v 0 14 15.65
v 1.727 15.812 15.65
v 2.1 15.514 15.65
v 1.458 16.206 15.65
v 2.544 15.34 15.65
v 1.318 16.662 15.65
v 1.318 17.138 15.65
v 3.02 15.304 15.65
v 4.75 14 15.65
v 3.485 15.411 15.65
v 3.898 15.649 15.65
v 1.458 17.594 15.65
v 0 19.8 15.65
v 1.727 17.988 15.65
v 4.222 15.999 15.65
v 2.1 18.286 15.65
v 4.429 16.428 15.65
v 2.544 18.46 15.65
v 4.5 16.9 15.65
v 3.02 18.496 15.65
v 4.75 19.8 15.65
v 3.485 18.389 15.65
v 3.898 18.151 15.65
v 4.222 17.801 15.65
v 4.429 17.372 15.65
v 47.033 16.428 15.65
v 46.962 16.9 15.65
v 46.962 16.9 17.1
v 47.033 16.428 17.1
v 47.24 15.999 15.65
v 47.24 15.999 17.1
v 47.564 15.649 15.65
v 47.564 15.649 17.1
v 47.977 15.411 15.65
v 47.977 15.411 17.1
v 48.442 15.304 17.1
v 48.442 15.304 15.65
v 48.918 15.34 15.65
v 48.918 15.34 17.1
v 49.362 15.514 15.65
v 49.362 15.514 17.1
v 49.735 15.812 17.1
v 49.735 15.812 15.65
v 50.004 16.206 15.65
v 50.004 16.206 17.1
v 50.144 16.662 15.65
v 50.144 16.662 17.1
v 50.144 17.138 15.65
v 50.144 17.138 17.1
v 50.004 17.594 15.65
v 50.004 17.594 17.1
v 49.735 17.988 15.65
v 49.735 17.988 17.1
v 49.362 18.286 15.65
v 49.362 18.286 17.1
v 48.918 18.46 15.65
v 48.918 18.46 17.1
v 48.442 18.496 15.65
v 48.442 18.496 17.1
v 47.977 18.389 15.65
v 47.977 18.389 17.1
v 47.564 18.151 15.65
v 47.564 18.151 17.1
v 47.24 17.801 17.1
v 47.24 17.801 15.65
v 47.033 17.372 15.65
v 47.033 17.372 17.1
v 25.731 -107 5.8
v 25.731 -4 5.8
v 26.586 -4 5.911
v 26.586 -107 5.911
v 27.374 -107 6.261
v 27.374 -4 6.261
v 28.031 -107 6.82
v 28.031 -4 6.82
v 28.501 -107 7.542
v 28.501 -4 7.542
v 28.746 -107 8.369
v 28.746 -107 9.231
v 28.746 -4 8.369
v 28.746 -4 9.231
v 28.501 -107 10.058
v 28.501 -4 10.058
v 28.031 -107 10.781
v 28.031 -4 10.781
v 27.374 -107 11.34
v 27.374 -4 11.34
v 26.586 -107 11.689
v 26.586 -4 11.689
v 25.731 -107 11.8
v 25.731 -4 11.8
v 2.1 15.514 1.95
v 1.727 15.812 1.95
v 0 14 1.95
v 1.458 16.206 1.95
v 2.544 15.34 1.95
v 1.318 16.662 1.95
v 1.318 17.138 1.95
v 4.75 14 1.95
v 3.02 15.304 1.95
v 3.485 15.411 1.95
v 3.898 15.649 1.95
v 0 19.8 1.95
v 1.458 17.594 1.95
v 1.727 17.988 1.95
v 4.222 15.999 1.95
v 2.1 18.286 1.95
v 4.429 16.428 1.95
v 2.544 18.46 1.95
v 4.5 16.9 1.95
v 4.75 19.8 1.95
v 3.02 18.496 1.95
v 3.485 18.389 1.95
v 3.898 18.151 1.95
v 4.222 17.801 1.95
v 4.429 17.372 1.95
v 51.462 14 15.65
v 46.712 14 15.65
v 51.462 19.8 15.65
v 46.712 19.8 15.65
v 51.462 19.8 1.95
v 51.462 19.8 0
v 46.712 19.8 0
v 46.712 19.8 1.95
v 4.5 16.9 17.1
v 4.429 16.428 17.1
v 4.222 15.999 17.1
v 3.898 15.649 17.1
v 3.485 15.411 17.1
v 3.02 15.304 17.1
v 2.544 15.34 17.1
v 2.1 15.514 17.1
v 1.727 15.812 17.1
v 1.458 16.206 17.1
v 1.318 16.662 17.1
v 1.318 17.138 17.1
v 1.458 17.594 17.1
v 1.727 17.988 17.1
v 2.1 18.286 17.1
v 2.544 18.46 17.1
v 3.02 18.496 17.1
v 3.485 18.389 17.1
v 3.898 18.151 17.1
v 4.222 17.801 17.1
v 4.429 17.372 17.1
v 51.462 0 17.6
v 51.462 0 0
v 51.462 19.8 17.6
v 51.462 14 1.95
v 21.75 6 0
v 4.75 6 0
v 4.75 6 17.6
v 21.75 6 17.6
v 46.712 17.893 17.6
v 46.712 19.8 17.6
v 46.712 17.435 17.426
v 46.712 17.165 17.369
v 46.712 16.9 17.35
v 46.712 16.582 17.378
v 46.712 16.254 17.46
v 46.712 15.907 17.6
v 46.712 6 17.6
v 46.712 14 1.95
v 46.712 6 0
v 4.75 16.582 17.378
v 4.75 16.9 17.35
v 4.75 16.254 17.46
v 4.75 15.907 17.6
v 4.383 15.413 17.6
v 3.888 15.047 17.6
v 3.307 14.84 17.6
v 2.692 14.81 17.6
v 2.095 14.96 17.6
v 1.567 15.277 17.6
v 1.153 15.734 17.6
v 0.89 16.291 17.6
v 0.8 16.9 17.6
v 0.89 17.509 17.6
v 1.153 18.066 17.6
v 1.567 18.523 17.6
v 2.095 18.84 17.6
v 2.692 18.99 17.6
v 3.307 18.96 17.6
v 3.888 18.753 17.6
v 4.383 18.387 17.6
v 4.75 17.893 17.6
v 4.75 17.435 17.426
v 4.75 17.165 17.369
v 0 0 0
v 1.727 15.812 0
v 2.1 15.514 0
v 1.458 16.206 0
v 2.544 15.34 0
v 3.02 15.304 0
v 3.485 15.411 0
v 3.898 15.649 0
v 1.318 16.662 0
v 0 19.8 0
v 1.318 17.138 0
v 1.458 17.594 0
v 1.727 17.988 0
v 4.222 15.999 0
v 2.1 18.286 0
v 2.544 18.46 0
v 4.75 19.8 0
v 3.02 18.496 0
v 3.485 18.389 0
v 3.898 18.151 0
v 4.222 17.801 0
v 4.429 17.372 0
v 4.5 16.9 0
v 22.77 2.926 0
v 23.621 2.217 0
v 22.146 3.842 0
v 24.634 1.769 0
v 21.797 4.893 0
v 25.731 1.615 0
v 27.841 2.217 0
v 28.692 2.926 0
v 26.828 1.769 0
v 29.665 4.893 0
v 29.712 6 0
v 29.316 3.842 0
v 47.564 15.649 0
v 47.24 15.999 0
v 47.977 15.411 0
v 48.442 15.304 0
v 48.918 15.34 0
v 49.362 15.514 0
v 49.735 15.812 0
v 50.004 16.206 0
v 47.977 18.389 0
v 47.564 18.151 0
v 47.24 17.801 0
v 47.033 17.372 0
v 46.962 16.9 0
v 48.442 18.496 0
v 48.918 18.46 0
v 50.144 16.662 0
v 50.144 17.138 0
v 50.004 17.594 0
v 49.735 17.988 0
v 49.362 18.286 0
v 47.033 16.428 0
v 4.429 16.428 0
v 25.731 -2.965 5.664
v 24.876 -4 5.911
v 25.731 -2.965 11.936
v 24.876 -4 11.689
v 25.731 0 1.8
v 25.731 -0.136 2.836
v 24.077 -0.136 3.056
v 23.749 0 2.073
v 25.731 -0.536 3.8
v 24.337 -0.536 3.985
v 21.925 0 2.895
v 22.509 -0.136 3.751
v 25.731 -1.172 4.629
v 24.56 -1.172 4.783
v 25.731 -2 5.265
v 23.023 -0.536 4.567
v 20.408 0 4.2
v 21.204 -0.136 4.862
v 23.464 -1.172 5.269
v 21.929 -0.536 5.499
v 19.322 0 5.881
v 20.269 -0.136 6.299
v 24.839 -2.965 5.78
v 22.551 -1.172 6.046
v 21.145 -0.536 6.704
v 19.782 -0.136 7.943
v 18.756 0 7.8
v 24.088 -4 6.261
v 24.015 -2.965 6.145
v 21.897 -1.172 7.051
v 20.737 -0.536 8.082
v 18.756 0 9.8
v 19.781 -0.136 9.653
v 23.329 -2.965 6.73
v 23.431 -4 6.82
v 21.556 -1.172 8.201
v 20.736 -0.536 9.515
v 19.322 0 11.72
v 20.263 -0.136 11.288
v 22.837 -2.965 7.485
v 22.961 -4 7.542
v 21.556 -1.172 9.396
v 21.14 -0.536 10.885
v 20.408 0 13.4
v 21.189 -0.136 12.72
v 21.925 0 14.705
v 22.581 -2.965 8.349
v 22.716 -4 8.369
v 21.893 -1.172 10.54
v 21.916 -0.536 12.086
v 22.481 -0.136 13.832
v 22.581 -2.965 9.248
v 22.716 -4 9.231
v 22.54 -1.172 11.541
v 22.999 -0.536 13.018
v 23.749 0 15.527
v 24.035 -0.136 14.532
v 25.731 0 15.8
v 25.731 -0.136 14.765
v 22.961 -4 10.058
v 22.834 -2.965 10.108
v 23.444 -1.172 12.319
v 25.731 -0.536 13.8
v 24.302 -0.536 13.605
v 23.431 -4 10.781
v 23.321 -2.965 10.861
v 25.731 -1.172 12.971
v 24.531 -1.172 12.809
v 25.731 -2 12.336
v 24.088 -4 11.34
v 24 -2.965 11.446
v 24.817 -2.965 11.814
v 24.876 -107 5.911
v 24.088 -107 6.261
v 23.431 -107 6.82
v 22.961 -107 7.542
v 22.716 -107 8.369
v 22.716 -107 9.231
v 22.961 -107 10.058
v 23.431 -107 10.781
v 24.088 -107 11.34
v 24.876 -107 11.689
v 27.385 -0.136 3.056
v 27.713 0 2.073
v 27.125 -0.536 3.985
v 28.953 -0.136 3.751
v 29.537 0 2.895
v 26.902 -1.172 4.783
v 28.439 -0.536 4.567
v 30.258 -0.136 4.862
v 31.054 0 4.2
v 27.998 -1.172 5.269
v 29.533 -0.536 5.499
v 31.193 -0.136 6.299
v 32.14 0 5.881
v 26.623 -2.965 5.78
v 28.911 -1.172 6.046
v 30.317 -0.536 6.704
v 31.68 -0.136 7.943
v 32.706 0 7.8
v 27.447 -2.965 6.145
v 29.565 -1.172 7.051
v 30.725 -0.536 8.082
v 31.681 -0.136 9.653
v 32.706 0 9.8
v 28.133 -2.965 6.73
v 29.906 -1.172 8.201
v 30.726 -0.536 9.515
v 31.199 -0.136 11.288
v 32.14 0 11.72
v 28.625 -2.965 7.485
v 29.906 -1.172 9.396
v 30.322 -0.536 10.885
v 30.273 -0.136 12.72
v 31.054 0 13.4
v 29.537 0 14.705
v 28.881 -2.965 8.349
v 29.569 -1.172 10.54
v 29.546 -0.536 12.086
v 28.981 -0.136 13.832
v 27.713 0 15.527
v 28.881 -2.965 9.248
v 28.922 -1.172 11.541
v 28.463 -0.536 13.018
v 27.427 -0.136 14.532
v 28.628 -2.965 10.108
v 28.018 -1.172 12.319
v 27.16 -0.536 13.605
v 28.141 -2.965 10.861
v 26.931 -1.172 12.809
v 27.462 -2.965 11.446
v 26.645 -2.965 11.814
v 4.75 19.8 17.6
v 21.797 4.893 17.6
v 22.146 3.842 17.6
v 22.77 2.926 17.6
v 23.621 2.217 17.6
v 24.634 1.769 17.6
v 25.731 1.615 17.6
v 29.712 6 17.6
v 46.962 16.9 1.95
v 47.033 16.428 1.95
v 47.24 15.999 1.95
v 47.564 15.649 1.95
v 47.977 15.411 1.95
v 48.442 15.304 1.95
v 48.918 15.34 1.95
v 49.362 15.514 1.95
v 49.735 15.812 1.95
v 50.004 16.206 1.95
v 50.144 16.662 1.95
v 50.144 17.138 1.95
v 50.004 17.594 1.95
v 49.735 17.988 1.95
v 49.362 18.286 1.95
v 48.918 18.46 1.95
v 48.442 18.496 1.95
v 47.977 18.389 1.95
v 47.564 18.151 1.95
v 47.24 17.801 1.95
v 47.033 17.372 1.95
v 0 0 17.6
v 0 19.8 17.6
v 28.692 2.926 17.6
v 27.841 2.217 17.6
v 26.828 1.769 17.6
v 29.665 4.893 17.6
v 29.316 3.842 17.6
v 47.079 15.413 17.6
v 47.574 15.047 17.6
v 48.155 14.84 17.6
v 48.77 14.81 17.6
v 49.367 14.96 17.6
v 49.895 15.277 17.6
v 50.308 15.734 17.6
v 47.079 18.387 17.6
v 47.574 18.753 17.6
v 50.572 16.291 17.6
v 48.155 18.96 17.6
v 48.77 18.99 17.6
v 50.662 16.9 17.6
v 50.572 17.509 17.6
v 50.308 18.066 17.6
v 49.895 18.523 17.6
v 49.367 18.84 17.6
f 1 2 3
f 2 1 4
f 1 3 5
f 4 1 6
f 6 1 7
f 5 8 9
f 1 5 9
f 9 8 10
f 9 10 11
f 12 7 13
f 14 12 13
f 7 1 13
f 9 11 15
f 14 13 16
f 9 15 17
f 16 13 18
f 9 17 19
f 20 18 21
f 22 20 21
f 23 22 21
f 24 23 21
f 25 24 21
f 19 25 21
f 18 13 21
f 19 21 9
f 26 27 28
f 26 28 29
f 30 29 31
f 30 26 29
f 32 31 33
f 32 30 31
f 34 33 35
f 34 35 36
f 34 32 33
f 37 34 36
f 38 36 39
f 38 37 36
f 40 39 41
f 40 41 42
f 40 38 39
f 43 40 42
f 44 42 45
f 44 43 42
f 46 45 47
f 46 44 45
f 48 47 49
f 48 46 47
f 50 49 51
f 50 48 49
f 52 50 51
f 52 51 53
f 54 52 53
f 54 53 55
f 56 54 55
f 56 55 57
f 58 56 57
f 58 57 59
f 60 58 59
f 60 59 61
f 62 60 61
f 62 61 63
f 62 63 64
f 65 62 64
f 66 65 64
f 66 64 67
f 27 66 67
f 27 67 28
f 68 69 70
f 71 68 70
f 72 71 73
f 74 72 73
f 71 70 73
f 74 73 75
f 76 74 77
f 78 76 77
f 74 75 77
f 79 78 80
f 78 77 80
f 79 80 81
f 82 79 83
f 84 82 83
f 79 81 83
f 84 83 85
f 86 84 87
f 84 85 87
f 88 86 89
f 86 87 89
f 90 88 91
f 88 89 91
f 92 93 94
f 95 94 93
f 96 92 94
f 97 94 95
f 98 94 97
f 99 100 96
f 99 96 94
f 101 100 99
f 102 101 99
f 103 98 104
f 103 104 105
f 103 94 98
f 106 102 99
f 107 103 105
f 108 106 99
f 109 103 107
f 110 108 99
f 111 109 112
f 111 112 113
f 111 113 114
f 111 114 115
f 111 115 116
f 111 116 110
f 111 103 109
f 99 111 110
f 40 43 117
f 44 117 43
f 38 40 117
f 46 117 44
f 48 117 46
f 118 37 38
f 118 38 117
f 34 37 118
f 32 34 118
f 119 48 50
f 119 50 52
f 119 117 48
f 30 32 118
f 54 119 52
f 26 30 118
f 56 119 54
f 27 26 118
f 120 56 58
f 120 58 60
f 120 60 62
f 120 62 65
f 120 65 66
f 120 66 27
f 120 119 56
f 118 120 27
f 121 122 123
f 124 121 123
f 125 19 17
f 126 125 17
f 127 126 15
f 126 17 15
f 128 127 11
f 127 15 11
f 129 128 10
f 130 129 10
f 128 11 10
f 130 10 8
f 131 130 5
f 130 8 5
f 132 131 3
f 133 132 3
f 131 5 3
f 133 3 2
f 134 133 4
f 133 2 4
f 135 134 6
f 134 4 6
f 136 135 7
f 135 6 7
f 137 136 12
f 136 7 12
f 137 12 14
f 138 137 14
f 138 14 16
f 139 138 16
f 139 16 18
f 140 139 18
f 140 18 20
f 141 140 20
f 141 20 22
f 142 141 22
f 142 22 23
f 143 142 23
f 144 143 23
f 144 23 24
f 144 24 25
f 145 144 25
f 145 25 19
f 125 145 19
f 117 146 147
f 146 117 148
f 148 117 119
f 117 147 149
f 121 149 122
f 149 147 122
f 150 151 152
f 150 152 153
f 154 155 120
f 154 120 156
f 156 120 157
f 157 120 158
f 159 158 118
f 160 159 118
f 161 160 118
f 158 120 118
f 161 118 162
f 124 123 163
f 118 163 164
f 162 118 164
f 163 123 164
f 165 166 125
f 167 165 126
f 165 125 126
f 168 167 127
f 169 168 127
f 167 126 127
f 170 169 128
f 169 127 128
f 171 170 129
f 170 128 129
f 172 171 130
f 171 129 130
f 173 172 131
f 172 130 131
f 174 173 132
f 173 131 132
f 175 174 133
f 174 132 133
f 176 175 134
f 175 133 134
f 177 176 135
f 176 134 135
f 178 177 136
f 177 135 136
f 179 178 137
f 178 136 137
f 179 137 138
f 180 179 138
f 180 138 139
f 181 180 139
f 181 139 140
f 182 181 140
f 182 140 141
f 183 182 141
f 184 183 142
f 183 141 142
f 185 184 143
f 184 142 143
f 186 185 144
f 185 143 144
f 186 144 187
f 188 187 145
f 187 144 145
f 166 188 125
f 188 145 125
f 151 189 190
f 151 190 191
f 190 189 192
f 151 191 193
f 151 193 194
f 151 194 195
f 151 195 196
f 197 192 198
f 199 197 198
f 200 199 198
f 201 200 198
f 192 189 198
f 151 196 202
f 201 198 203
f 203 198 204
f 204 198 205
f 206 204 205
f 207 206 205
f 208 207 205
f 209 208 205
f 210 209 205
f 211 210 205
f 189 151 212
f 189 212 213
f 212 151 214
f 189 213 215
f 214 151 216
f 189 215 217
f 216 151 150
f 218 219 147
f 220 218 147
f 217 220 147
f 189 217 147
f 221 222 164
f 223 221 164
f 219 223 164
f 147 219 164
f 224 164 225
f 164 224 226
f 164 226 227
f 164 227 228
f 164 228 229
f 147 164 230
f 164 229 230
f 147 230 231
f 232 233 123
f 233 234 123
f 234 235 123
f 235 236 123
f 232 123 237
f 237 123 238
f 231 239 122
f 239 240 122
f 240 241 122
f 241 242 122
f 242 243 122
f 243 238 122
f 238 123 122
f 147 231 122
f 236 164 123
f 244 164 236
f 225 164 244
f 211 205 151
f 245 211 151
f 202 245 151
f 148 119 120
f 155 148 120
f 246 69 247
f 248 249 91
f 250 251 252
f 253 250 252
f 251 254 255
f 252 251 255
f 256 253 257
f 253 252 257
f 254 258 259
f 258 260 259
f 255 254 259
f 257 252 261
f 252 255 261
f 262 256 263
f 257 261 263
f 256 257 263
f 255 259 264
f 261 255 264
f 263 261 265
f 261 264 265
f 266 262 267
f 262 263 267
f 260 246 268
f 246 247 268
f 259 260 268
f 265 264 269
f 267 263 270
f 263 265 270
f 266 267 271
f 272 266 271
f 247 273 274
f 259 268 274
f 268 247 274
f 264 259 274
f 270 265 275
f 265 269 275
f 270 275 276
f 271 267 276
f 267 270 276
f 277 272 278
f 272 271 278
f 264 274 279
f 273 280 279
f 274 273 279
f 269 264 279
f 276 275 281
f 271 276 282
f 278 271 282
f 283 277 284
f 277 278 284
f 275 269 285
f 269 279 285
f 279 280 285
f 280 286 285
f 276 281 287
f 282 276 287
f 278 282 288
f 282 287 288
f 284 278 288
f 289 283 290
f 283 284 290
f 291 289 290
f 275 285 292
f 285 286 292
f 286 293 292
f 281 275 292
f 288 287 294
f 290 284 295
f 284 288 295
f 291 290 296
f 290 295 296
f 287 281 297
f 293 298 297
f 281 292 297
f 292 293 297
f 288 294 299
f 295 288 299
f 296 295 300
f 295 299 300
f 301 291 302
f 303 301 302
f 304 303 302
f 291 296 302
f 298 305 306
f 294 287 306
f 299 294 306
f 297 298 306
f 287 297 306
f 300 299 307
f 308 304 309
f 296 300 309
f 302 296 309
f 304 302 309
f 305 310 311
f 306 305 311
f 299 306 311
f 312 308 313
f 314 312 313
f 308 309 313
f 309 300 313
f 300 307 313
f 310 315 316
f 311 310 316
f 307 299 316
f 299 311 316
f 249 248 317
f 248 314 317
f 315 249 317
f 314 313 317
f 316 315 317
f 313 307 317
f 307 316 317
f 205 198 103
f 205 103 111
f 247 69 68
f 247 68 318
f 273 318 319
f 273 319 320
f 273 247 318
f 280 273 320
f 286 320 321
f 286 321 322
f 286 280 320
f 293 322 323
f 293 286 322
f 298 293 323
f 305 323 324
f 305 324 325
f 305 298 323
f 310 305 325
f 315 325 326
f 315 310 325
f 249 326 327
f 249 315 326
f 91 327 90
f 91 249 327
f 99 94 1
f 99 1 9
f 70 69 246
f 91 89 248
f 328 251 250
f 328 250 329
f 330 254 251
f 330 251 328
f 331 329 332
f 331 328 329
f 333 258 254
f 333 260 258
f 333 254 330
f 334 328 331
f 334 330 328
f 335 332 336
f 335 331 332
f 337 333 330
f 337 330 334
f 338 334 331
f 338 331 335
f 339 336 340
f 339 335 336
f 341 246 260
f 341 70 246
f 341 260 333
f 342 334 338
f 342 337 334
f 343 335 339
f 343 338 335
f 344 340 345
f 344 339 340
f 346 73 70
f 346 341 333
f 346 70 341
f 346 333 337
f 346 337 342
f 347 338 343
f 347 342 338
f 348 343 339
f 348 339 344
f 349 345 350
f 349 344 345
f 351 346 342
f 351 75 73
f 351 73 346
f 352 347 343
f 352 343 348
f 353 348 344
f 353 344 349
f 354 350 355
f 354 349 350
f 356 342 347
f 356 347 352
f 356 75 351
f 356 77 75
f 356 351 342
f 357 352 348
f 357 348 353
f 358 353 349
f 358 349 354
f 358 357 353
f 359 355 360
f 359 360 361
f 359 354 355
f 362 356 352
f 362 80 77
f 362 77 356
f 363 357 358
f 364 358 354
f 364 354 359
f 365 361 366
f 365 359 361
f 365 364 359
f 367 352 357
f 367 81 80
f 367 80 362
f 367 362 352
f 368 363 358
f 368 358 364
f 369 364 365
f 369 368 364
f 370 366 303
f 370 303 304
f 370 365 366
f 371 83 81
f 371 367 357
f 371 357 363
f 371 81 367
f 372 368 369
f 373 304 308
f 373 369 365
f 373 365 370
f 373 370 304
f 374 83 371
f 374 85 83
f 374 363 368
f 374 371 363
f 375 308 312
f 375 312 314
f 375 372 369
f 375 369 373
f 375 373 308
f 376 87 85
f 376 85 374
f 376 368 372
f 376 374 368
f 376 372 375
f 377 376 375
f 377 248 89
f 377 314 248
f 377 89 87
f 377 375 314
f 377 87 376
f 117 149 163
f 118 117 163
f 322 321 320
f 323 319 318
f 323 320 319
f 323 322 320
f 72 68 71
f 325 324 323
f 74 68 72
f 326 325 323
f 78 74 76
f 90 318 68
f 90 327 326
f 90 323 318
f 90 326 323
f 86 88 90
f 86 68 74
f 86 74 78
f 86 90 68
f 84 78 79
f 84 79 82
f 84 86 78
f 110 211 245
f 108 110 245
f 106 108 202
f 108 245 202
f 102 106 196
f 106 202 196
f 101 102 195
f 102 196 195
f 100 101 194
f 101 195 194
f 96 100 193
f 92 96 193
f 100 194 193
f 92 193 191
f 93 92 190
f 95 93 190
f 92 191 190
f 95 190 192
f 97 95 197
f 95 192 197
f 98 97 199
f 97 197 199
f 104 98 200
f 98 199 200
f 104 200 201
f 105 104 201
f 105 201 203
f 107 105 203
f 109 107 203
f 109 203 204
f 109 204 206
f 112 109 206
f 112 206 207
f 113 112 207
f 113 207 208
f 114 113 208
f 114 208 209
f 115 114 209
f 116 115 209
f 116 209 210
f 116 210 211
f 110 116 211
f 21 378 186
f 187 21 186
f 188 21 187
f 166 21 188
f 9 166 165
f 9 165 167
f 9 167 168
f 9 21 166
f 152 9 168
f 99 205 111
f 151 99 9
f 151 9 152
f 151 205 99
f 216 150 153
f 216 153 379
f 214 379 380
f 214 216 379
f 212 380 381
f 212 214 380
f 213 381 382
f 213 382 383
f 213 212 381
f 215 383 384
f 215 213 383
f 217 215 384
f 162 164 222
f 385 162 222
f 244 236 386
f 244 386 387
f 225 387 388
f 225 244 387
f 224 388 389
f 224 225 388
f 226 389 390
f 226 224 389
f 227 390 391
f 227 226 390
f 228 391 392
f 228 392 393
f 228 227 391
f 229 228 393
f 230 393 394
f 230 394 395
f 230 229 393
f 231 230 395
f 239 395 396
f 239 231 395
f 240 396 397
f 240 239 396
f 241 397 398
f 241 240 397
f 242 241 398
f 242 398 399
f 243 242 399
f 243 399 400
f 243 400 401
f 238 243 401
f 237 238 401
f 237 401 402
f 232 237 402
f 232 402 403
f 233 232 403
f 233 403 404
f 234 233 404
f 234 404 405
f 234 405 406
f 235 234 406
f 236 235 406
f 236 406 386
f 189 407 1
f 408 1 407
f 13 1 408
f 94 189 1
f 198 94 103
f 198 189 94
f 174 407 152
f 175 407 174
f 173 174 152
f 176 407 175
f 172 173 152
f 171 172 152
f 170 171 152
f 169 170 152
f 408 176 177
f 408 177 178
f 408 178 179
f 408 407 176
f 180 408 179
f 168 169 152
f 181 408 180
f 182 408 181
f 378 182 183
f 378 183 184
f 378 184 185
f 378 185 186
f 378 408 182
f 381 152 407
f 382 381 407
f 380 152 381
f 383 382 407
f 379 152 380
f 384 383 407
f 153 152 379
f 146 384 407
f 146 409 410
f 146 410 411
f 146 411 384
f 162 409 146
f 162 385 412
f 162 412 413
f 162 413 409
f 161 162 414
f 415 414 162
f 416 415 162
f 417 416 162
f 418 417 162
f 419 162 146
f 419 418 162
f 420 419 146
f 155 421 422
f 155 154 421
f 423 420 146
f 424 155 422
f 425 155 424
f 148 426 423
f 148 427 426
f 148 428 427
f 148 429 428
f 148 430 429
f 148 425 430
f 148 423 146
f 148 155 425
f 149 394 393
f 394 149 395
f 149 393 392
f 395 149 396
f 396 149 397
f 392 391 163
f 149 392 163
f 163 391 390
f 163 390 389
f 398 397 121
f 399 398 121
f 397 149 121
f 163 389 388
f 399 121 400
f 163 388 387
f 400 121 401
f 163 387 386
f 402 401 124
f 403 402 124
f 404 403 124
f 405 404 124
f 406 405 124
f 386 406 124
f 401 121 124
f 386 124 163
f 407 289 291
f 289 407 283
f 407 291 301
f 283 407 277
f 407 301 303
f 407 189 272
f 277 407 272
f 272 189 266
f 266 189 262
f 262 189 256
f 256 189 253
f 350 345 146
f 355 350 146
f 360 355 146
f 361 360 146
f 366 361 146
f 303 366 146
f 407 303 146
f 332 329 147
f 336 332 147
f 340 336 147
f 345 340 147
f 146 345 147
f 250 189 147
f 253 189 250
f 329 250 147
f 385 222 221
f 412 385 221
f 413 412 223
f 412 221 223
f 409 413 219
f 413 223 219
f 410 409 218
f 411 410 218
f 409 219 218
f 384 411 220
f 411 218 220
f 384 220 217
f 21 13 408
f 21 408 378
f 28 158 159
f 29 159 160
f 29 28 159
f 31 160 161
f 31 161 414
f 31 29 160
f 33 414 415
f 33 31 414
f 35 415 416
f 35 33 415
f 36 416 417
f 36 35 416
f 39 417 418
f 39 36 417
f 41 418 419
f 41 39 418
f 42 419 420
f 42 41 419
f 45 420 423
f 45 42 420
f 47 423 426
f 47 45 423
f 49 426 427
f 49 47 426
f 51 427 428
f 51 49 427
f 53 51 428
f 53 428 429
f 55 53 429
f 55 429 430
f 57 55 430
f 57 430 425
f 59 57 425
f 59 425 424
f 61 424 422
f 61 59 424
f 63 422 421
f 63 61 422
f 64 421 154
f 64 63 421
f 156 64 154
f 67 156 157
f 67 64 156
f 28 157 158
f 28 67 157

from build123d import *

# Parameters (mm, degrees)
BOSS_EXTRUDE1_DEPTH = 17.6
SKETCH4_W           = 4.750417
SKETCH4_H           = 13.7
CUT_EXTRUDE1_DEPTH  = 5.8
SKETCH5_R           = 1.6
CUT_EXTRUDE2_DEPTH  = 17.8
BOSS_EXTRUDE2_DEPTH = 107
FILLET1_R           = 4
CHAMFER1_SIZE       = 0.5


with BuildPart() as part:
    # Sketch3 → Boss-Extrude1 (new body)
    with BuildSketch(Plane.XY):
        with BuildLine():
            Line((0, 0), (0, 19.8))
            Line((0, 19.8), (4.750417, 19.8))
            Line((4.750417, 19.8), (4.750417, 6))
            Line((4.750417, 6), (21.75, 6))
            ThreePointArc((21.75, 6), (22.769877953, 2.926324181), (25.730987279, 1.615040214))
            Line((25.730987279, 1.615040214), (25.730987279, 0))
            Line((25.730987279, 0), (0, 0))
        make_face()
    extrude(amount=BOSS_EXTRUDE1_DEPTH)

    # Sketch4 → Cut-Extrude1 (cut)
    with BuildSketch(Plane(origin=(0, 19.8, 0), x_dir=(1, 0, 0), z_dir=(0, 1, 0))):
        with Locations((2.3752085, -8.8)):
            Rectangle(SKETCH4_W, SKETCH4_H)
    extrude(amount=-CUT_EXTRUDE1_DEPTH, mode=Mode.SUBTRACT)

    # Sketch5 → Cut-Extrude2 (cut)
    with BuildSketch(Plane(origin=(0, 0, 0), x_dir=(-1, 0, 0), z_dir=(0, 0, -1))):
        with Locations(Location((-2.9, 16.9, 0), (0, 0, 180))):
            Circle(SKETCH5_R)
    extrude(amount=-CUT_EXTRUDE2_DEPTH, mode=Mode.SUBTRACT)

    # Sketch6 → Boss-Extrude2 (add)
    with BuildSketch(Plane.XZ):
        with BuildLine():
            Line((25.730987279, 11.799763823), (25.730987279, 5.800480479))
            ThreePointArc((25.730987279, 5.800480479), (22.684620888, 8.800122151), (25.730987279, 11.799763823))
        make_face()
    extrude(amount=BOSS_EXTRUDE2_DEPTH)

    # Fillet1
    fillet1_edges = [part.edges().sort_by_distance(p)[0] for p in [
        (22.684620888, 0, 8.800122151),
    ]]
    fillet(fillet1_edges, radius=FILLET1_R)

    # Chamfer1
    # the kernel refuses this chamfer: 0.5 mm, written as the material it takes off along each edge
    with BuildSketch(Plane(origin=(2.9, 16.9, 17.6), x_dir=(1, 0, 0), z_dir=(0, 1, 0))) as chamfer1_piece_1:
        Polygon((1.6 + CHAMFER1_SIZE, 0), (1.6, CHAMFER1_SIZE), (1.6, 0), align=None)
    revolve(axis=Axis((2.9, 16.9, 17.6), (0, 0, -1)), mode=Mode.SUBTRACT)

    # Mirror4: part across plane


with BuildPart() as part_1:
    add(part.part)
    add(part.part.mirror(Plane(origin=(25.730987279, 0, 17.6), x_dir=(0, 0, 1), z_dir=(-1, 0, 0))))


solid = part_1.part
